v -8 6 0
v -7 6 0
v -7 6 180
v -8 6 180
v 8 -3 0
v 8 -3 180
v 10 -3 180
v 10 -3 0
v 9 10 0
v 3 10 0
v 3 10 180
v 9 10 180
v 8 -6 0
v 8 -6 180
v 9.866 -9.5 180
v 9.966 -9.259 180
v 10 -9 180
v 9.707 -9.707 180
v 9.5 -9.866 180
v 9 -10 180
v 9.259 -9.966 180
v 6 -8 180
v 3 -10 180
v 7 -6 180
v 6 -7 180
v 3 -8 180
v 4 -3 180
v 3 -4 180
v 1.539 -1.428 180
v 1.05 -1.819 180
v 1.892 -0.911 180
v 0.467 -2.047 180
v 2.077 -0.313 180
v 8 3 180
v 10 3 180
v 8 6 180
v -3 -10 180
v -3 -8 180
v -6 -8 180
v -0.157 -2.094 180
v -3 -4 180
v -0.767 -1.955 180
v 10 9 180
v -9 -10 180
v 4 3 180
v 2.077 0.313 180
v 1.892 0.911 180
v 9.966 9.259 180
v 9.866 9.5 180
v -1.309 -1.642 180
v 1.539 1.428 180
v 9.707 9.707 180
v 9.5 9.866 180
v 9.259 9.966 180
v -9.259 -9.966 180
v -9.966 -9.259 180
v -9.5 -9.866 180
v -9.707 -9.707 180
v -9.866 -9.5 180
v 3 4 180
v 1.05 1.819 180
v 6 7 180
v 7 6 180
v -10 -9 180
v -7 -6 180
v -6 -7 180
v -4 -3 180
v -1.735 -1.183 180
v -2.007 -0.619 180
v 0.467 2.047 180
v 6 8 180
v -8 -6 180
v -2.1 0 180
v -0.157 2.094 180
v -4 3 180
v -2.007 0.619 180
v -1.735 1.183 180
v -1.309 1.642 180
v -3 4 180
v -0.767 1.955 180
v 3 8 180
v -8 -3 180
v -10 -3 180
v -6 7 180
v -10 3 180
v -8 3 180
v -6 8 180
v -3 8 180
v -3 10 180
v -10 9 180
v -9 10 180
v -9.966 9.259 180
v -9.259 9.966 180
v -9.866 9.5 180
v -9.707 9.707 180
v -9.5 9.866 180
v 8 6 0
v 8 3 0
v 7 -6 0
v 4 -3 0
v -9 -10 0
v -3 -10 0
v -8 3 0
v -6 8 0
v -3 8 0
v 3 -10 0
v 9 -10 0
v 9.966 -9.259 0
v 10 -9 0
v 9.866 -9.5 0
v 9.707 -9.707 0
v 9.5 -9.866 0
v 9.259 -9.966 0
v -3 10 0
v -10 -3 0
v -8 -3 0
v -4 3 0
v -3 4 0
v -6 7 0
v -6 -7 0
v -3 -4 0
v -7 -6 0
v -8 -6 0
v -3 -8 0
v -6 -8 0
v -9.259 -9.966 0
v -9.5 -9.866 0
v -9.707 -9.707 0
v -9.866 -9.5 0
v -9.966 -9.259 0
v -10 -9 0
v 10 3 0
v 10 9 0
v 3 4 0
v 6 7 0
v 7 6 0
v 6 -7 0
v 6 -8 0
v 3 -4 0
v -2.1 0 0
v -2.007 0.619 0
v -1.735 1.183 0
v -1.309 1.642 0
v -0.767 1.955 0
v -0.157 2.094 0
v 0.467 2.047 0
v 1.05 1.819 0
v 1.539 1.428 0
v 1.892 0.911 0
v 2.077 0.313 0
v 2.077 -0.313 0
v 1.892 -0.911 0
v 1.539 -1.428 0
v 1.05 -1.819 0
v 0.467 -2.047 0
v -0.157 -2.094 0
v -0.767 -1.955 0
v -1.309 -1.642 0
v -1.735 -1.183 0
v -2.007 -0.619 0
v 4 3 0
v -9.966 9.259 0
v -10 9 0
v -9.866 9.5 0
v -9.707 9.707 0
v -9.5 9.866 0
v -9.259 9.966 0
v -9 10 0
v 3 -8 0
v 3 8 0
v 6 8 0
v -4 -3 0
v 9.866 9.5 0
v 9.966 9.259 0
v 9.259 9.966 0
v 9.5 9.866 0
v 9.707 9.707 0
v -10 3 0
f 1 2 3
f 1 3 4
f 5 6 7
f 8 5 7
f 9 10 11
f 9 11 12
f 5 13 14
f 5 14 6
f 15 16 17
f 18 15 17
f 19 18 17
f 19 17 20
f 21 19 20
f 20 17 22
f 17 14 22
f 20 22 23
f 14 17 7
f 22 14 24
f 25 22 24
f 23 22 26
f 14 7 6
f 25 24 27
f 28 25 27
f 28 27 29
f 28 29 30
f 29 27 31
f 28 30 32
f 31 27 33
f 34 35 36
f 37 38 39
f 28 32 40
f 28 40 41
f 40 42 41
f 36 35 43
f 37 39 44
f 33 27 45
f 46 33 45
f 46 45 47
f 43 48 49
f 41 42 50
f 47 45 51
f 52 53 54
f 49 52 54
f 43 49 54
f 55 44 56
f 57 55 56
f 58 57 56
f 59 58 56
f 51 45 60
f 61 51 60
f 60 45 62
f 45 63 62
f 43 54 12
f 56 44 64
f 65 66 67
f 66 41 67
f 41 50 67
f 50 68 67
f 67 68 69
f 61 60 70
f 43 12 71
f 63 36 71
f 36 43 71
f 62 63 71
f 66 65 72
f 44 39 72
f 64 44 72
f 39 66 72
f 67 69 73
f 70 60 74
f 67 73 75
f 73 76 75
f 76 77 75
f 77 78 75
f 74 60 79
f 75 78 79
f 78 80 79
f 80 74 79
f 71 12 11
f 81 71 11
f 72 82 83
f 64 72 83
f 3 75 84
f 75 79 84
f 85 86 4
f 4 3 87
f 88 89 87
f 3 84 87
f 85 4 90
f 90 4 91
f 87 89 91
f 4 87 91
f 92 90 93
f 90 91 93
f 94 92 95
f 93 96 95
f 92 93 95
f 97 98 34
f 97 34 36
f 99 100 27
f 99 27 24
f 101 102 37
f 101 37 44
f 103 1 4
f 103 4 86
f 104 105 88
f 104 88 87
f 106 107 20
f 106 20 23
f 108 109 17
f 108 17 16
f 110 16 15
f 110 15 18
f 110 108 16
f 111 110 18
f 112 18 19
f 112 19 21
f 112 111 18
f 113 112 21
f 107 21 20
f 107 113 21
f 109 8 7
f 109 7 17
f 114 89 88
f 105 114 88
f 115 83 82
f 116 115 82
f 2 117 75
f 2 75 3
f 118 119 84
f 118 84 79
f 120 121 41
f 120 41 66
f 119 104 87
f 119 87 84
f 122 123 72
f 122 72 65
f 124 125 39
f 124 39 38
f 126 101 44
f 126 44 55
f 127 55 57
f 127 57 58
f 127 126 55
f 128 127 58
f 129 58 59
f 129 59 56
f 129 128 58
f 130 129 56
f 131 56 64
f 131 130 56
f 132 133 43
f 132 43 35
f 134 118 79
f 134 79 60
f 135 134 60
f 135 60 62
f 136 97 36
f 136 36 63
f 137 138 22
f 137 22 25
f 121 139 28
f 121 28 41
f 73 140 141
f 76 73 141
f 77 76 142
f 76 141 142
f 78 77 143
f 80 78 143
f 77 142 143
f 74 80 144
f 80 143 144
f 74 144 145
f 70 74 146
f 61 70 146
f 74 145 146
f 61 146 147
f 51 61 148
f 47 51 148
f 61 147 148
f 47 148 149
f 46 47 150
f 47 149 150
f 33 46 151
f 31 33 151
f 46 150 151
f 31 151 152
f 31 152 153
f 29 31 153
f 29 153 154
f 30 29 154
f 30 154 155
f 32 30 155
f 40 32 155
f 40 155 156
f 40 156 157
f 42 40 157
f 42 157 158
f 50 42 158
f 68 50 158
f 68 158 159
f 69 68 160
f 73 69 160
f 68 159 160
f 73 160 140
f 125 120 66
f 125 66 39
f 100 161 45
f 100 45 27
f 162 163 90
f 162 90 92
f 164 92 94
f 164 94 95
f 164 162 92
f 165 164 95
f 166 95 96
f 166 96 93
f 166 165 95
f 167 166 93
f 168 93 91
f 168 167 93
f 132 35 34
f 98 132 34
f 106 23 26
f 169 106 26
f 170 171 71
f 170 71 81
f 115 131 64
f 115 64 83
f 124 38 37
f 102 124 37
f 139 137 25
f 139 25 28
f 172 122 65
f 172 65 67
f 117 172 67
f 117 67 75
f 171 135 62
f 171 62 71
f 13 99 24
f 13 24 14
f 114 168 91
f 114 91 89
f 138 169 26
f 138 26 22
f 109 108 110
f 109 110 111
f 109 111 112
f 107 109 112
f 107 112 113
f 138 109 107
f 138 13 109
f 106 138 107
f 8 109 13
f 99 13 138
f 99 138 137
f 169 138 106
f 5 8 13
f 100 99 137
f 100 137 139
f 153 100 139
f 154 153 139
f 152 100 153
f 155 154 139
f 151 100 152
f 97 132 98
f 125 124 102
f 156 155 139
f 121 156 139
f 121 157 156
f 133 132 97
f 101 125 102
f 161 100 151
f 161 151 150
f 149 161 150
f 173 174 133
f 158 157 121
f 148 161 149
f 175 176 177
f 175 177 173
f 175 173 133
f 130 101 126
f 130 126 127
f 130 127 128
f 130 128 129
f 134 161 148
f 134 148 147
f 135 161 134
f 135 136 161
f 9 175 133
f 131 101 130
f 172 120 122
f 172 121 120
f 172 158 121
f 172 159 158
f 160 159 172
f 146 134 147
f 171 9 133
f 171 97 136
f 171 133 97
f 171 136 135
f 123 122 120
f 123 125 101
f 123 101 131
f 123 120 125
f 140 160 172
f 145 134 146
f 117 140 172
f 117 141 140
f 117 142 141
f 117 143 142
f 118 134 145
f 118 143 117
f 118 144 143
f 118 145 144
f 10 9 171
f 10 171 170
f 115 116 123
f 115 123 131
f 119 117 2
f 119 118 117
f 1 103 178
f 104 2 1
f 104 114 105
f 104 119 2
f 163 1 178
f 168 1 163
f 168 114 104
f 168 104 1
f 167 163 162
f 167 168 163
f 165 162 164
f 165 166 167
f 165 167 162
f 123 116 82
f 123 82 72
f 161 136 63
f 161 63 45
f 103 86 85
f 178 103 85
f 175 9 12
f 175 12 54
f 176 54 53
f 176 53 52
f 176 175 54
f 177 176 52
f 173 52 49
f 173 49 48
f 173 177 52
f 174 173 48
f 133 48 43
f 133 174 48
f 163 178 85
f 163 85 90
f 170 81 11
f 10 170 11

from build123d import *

# Parameters (mm, degrees)
SKETCH1_R           = 2.1
BOSS_EXTRUDE1_DEPTH = 180


with BuildPart() as part:
    # Sketch1 → Boss-Extrude1 (new body)
    with BuildSketch(Plane(origin=(0, 0, 0), x_dir=(-1, 0, 0), z_dir=(0, 0, -1))):
        with BuildLine():
            Line((6, -8), (3, -8))
            Line((3, -8), (3, -10))
            Line((3, -10), (9, -10))
            ThreePointArc((9, -10), (9.707106781, -9.707106781), (10, -9))
            Line((10, -9), (10, -3))
            Line((10, -3), (8, -3))
            Line((8, -3), (8, -6))
            Line((8, -6), (7, -6))
            Line((7, -6), (4, -3))
            Line((4, -3), (4, 3))
            Line((4, 3), (7, 6))
            Line((7, 6), (8, 6))
            Line((8, 6), (8, 3))
            Line((8, 3), (10, 3))
            Line((10, 3), (10, 9))
            ThreePointArc((10, 9), (9.707106781, 9.707106781), (9, 10))
            Line((9, 10), (3, 10))
            Line((3, 10), (3, 8))
            Line((3, 8), (6, 8))
            Line((6, 8), (6, 7))
            Line((6, 7), (3, 4))
            Line((3, 4), (-3, 4))
            Line((-3, 4), (-6, 7))
            Line((-6, 7), (-6, 8))
            Line((-6, 8), (-3, 8))
            Line((-3, 8), (-3, 10))
            Line((-3, 10), (-9, 10))
            ThreePointArc((-9, 10), (-9.707106781, 9.707106781), (-10, 9))
            Line((-10, 9), (-10, 3))
            Line((-10, 3), (-8, 3))
            Line((-8, 3), (-8, 6))
            Line((-8, 6), (-7, 6))
            Line((-7, 6), (-4, 3))
            Line((-4, 3), (-4, -3))
            Line((-4, -3), (-7, -6))
            Line((-7, -6), (-8, -6))
            Line((-8, -6), (-8, -3))
            Line((-8, -3), (-10, -3))
            Line((-10, -3), (-10, -9))
            ThreePointArc((-10, -9), (-9.707106781, -9.707106781), (-9, -10))
            Line((-9, -10), (-3, -10))
            Line((-3, -10), (-3, -8))
            Line((-3, -8), (-6, -8))
            Line((-6, -8), (-6, -7))
            Line((-6, -7), (-3, -4))
            Line((-3, -4), (3, -4))
            Line((3, -4), (6, -7))
            Line((6, -7), (6, -8))
        make_face()
        Circle(SKETCH1_R, mode=Mode.SUBTRACT)
    extrude(amount=-BOSS_EXTRUDE1_DEPTH)


solid = part.part
